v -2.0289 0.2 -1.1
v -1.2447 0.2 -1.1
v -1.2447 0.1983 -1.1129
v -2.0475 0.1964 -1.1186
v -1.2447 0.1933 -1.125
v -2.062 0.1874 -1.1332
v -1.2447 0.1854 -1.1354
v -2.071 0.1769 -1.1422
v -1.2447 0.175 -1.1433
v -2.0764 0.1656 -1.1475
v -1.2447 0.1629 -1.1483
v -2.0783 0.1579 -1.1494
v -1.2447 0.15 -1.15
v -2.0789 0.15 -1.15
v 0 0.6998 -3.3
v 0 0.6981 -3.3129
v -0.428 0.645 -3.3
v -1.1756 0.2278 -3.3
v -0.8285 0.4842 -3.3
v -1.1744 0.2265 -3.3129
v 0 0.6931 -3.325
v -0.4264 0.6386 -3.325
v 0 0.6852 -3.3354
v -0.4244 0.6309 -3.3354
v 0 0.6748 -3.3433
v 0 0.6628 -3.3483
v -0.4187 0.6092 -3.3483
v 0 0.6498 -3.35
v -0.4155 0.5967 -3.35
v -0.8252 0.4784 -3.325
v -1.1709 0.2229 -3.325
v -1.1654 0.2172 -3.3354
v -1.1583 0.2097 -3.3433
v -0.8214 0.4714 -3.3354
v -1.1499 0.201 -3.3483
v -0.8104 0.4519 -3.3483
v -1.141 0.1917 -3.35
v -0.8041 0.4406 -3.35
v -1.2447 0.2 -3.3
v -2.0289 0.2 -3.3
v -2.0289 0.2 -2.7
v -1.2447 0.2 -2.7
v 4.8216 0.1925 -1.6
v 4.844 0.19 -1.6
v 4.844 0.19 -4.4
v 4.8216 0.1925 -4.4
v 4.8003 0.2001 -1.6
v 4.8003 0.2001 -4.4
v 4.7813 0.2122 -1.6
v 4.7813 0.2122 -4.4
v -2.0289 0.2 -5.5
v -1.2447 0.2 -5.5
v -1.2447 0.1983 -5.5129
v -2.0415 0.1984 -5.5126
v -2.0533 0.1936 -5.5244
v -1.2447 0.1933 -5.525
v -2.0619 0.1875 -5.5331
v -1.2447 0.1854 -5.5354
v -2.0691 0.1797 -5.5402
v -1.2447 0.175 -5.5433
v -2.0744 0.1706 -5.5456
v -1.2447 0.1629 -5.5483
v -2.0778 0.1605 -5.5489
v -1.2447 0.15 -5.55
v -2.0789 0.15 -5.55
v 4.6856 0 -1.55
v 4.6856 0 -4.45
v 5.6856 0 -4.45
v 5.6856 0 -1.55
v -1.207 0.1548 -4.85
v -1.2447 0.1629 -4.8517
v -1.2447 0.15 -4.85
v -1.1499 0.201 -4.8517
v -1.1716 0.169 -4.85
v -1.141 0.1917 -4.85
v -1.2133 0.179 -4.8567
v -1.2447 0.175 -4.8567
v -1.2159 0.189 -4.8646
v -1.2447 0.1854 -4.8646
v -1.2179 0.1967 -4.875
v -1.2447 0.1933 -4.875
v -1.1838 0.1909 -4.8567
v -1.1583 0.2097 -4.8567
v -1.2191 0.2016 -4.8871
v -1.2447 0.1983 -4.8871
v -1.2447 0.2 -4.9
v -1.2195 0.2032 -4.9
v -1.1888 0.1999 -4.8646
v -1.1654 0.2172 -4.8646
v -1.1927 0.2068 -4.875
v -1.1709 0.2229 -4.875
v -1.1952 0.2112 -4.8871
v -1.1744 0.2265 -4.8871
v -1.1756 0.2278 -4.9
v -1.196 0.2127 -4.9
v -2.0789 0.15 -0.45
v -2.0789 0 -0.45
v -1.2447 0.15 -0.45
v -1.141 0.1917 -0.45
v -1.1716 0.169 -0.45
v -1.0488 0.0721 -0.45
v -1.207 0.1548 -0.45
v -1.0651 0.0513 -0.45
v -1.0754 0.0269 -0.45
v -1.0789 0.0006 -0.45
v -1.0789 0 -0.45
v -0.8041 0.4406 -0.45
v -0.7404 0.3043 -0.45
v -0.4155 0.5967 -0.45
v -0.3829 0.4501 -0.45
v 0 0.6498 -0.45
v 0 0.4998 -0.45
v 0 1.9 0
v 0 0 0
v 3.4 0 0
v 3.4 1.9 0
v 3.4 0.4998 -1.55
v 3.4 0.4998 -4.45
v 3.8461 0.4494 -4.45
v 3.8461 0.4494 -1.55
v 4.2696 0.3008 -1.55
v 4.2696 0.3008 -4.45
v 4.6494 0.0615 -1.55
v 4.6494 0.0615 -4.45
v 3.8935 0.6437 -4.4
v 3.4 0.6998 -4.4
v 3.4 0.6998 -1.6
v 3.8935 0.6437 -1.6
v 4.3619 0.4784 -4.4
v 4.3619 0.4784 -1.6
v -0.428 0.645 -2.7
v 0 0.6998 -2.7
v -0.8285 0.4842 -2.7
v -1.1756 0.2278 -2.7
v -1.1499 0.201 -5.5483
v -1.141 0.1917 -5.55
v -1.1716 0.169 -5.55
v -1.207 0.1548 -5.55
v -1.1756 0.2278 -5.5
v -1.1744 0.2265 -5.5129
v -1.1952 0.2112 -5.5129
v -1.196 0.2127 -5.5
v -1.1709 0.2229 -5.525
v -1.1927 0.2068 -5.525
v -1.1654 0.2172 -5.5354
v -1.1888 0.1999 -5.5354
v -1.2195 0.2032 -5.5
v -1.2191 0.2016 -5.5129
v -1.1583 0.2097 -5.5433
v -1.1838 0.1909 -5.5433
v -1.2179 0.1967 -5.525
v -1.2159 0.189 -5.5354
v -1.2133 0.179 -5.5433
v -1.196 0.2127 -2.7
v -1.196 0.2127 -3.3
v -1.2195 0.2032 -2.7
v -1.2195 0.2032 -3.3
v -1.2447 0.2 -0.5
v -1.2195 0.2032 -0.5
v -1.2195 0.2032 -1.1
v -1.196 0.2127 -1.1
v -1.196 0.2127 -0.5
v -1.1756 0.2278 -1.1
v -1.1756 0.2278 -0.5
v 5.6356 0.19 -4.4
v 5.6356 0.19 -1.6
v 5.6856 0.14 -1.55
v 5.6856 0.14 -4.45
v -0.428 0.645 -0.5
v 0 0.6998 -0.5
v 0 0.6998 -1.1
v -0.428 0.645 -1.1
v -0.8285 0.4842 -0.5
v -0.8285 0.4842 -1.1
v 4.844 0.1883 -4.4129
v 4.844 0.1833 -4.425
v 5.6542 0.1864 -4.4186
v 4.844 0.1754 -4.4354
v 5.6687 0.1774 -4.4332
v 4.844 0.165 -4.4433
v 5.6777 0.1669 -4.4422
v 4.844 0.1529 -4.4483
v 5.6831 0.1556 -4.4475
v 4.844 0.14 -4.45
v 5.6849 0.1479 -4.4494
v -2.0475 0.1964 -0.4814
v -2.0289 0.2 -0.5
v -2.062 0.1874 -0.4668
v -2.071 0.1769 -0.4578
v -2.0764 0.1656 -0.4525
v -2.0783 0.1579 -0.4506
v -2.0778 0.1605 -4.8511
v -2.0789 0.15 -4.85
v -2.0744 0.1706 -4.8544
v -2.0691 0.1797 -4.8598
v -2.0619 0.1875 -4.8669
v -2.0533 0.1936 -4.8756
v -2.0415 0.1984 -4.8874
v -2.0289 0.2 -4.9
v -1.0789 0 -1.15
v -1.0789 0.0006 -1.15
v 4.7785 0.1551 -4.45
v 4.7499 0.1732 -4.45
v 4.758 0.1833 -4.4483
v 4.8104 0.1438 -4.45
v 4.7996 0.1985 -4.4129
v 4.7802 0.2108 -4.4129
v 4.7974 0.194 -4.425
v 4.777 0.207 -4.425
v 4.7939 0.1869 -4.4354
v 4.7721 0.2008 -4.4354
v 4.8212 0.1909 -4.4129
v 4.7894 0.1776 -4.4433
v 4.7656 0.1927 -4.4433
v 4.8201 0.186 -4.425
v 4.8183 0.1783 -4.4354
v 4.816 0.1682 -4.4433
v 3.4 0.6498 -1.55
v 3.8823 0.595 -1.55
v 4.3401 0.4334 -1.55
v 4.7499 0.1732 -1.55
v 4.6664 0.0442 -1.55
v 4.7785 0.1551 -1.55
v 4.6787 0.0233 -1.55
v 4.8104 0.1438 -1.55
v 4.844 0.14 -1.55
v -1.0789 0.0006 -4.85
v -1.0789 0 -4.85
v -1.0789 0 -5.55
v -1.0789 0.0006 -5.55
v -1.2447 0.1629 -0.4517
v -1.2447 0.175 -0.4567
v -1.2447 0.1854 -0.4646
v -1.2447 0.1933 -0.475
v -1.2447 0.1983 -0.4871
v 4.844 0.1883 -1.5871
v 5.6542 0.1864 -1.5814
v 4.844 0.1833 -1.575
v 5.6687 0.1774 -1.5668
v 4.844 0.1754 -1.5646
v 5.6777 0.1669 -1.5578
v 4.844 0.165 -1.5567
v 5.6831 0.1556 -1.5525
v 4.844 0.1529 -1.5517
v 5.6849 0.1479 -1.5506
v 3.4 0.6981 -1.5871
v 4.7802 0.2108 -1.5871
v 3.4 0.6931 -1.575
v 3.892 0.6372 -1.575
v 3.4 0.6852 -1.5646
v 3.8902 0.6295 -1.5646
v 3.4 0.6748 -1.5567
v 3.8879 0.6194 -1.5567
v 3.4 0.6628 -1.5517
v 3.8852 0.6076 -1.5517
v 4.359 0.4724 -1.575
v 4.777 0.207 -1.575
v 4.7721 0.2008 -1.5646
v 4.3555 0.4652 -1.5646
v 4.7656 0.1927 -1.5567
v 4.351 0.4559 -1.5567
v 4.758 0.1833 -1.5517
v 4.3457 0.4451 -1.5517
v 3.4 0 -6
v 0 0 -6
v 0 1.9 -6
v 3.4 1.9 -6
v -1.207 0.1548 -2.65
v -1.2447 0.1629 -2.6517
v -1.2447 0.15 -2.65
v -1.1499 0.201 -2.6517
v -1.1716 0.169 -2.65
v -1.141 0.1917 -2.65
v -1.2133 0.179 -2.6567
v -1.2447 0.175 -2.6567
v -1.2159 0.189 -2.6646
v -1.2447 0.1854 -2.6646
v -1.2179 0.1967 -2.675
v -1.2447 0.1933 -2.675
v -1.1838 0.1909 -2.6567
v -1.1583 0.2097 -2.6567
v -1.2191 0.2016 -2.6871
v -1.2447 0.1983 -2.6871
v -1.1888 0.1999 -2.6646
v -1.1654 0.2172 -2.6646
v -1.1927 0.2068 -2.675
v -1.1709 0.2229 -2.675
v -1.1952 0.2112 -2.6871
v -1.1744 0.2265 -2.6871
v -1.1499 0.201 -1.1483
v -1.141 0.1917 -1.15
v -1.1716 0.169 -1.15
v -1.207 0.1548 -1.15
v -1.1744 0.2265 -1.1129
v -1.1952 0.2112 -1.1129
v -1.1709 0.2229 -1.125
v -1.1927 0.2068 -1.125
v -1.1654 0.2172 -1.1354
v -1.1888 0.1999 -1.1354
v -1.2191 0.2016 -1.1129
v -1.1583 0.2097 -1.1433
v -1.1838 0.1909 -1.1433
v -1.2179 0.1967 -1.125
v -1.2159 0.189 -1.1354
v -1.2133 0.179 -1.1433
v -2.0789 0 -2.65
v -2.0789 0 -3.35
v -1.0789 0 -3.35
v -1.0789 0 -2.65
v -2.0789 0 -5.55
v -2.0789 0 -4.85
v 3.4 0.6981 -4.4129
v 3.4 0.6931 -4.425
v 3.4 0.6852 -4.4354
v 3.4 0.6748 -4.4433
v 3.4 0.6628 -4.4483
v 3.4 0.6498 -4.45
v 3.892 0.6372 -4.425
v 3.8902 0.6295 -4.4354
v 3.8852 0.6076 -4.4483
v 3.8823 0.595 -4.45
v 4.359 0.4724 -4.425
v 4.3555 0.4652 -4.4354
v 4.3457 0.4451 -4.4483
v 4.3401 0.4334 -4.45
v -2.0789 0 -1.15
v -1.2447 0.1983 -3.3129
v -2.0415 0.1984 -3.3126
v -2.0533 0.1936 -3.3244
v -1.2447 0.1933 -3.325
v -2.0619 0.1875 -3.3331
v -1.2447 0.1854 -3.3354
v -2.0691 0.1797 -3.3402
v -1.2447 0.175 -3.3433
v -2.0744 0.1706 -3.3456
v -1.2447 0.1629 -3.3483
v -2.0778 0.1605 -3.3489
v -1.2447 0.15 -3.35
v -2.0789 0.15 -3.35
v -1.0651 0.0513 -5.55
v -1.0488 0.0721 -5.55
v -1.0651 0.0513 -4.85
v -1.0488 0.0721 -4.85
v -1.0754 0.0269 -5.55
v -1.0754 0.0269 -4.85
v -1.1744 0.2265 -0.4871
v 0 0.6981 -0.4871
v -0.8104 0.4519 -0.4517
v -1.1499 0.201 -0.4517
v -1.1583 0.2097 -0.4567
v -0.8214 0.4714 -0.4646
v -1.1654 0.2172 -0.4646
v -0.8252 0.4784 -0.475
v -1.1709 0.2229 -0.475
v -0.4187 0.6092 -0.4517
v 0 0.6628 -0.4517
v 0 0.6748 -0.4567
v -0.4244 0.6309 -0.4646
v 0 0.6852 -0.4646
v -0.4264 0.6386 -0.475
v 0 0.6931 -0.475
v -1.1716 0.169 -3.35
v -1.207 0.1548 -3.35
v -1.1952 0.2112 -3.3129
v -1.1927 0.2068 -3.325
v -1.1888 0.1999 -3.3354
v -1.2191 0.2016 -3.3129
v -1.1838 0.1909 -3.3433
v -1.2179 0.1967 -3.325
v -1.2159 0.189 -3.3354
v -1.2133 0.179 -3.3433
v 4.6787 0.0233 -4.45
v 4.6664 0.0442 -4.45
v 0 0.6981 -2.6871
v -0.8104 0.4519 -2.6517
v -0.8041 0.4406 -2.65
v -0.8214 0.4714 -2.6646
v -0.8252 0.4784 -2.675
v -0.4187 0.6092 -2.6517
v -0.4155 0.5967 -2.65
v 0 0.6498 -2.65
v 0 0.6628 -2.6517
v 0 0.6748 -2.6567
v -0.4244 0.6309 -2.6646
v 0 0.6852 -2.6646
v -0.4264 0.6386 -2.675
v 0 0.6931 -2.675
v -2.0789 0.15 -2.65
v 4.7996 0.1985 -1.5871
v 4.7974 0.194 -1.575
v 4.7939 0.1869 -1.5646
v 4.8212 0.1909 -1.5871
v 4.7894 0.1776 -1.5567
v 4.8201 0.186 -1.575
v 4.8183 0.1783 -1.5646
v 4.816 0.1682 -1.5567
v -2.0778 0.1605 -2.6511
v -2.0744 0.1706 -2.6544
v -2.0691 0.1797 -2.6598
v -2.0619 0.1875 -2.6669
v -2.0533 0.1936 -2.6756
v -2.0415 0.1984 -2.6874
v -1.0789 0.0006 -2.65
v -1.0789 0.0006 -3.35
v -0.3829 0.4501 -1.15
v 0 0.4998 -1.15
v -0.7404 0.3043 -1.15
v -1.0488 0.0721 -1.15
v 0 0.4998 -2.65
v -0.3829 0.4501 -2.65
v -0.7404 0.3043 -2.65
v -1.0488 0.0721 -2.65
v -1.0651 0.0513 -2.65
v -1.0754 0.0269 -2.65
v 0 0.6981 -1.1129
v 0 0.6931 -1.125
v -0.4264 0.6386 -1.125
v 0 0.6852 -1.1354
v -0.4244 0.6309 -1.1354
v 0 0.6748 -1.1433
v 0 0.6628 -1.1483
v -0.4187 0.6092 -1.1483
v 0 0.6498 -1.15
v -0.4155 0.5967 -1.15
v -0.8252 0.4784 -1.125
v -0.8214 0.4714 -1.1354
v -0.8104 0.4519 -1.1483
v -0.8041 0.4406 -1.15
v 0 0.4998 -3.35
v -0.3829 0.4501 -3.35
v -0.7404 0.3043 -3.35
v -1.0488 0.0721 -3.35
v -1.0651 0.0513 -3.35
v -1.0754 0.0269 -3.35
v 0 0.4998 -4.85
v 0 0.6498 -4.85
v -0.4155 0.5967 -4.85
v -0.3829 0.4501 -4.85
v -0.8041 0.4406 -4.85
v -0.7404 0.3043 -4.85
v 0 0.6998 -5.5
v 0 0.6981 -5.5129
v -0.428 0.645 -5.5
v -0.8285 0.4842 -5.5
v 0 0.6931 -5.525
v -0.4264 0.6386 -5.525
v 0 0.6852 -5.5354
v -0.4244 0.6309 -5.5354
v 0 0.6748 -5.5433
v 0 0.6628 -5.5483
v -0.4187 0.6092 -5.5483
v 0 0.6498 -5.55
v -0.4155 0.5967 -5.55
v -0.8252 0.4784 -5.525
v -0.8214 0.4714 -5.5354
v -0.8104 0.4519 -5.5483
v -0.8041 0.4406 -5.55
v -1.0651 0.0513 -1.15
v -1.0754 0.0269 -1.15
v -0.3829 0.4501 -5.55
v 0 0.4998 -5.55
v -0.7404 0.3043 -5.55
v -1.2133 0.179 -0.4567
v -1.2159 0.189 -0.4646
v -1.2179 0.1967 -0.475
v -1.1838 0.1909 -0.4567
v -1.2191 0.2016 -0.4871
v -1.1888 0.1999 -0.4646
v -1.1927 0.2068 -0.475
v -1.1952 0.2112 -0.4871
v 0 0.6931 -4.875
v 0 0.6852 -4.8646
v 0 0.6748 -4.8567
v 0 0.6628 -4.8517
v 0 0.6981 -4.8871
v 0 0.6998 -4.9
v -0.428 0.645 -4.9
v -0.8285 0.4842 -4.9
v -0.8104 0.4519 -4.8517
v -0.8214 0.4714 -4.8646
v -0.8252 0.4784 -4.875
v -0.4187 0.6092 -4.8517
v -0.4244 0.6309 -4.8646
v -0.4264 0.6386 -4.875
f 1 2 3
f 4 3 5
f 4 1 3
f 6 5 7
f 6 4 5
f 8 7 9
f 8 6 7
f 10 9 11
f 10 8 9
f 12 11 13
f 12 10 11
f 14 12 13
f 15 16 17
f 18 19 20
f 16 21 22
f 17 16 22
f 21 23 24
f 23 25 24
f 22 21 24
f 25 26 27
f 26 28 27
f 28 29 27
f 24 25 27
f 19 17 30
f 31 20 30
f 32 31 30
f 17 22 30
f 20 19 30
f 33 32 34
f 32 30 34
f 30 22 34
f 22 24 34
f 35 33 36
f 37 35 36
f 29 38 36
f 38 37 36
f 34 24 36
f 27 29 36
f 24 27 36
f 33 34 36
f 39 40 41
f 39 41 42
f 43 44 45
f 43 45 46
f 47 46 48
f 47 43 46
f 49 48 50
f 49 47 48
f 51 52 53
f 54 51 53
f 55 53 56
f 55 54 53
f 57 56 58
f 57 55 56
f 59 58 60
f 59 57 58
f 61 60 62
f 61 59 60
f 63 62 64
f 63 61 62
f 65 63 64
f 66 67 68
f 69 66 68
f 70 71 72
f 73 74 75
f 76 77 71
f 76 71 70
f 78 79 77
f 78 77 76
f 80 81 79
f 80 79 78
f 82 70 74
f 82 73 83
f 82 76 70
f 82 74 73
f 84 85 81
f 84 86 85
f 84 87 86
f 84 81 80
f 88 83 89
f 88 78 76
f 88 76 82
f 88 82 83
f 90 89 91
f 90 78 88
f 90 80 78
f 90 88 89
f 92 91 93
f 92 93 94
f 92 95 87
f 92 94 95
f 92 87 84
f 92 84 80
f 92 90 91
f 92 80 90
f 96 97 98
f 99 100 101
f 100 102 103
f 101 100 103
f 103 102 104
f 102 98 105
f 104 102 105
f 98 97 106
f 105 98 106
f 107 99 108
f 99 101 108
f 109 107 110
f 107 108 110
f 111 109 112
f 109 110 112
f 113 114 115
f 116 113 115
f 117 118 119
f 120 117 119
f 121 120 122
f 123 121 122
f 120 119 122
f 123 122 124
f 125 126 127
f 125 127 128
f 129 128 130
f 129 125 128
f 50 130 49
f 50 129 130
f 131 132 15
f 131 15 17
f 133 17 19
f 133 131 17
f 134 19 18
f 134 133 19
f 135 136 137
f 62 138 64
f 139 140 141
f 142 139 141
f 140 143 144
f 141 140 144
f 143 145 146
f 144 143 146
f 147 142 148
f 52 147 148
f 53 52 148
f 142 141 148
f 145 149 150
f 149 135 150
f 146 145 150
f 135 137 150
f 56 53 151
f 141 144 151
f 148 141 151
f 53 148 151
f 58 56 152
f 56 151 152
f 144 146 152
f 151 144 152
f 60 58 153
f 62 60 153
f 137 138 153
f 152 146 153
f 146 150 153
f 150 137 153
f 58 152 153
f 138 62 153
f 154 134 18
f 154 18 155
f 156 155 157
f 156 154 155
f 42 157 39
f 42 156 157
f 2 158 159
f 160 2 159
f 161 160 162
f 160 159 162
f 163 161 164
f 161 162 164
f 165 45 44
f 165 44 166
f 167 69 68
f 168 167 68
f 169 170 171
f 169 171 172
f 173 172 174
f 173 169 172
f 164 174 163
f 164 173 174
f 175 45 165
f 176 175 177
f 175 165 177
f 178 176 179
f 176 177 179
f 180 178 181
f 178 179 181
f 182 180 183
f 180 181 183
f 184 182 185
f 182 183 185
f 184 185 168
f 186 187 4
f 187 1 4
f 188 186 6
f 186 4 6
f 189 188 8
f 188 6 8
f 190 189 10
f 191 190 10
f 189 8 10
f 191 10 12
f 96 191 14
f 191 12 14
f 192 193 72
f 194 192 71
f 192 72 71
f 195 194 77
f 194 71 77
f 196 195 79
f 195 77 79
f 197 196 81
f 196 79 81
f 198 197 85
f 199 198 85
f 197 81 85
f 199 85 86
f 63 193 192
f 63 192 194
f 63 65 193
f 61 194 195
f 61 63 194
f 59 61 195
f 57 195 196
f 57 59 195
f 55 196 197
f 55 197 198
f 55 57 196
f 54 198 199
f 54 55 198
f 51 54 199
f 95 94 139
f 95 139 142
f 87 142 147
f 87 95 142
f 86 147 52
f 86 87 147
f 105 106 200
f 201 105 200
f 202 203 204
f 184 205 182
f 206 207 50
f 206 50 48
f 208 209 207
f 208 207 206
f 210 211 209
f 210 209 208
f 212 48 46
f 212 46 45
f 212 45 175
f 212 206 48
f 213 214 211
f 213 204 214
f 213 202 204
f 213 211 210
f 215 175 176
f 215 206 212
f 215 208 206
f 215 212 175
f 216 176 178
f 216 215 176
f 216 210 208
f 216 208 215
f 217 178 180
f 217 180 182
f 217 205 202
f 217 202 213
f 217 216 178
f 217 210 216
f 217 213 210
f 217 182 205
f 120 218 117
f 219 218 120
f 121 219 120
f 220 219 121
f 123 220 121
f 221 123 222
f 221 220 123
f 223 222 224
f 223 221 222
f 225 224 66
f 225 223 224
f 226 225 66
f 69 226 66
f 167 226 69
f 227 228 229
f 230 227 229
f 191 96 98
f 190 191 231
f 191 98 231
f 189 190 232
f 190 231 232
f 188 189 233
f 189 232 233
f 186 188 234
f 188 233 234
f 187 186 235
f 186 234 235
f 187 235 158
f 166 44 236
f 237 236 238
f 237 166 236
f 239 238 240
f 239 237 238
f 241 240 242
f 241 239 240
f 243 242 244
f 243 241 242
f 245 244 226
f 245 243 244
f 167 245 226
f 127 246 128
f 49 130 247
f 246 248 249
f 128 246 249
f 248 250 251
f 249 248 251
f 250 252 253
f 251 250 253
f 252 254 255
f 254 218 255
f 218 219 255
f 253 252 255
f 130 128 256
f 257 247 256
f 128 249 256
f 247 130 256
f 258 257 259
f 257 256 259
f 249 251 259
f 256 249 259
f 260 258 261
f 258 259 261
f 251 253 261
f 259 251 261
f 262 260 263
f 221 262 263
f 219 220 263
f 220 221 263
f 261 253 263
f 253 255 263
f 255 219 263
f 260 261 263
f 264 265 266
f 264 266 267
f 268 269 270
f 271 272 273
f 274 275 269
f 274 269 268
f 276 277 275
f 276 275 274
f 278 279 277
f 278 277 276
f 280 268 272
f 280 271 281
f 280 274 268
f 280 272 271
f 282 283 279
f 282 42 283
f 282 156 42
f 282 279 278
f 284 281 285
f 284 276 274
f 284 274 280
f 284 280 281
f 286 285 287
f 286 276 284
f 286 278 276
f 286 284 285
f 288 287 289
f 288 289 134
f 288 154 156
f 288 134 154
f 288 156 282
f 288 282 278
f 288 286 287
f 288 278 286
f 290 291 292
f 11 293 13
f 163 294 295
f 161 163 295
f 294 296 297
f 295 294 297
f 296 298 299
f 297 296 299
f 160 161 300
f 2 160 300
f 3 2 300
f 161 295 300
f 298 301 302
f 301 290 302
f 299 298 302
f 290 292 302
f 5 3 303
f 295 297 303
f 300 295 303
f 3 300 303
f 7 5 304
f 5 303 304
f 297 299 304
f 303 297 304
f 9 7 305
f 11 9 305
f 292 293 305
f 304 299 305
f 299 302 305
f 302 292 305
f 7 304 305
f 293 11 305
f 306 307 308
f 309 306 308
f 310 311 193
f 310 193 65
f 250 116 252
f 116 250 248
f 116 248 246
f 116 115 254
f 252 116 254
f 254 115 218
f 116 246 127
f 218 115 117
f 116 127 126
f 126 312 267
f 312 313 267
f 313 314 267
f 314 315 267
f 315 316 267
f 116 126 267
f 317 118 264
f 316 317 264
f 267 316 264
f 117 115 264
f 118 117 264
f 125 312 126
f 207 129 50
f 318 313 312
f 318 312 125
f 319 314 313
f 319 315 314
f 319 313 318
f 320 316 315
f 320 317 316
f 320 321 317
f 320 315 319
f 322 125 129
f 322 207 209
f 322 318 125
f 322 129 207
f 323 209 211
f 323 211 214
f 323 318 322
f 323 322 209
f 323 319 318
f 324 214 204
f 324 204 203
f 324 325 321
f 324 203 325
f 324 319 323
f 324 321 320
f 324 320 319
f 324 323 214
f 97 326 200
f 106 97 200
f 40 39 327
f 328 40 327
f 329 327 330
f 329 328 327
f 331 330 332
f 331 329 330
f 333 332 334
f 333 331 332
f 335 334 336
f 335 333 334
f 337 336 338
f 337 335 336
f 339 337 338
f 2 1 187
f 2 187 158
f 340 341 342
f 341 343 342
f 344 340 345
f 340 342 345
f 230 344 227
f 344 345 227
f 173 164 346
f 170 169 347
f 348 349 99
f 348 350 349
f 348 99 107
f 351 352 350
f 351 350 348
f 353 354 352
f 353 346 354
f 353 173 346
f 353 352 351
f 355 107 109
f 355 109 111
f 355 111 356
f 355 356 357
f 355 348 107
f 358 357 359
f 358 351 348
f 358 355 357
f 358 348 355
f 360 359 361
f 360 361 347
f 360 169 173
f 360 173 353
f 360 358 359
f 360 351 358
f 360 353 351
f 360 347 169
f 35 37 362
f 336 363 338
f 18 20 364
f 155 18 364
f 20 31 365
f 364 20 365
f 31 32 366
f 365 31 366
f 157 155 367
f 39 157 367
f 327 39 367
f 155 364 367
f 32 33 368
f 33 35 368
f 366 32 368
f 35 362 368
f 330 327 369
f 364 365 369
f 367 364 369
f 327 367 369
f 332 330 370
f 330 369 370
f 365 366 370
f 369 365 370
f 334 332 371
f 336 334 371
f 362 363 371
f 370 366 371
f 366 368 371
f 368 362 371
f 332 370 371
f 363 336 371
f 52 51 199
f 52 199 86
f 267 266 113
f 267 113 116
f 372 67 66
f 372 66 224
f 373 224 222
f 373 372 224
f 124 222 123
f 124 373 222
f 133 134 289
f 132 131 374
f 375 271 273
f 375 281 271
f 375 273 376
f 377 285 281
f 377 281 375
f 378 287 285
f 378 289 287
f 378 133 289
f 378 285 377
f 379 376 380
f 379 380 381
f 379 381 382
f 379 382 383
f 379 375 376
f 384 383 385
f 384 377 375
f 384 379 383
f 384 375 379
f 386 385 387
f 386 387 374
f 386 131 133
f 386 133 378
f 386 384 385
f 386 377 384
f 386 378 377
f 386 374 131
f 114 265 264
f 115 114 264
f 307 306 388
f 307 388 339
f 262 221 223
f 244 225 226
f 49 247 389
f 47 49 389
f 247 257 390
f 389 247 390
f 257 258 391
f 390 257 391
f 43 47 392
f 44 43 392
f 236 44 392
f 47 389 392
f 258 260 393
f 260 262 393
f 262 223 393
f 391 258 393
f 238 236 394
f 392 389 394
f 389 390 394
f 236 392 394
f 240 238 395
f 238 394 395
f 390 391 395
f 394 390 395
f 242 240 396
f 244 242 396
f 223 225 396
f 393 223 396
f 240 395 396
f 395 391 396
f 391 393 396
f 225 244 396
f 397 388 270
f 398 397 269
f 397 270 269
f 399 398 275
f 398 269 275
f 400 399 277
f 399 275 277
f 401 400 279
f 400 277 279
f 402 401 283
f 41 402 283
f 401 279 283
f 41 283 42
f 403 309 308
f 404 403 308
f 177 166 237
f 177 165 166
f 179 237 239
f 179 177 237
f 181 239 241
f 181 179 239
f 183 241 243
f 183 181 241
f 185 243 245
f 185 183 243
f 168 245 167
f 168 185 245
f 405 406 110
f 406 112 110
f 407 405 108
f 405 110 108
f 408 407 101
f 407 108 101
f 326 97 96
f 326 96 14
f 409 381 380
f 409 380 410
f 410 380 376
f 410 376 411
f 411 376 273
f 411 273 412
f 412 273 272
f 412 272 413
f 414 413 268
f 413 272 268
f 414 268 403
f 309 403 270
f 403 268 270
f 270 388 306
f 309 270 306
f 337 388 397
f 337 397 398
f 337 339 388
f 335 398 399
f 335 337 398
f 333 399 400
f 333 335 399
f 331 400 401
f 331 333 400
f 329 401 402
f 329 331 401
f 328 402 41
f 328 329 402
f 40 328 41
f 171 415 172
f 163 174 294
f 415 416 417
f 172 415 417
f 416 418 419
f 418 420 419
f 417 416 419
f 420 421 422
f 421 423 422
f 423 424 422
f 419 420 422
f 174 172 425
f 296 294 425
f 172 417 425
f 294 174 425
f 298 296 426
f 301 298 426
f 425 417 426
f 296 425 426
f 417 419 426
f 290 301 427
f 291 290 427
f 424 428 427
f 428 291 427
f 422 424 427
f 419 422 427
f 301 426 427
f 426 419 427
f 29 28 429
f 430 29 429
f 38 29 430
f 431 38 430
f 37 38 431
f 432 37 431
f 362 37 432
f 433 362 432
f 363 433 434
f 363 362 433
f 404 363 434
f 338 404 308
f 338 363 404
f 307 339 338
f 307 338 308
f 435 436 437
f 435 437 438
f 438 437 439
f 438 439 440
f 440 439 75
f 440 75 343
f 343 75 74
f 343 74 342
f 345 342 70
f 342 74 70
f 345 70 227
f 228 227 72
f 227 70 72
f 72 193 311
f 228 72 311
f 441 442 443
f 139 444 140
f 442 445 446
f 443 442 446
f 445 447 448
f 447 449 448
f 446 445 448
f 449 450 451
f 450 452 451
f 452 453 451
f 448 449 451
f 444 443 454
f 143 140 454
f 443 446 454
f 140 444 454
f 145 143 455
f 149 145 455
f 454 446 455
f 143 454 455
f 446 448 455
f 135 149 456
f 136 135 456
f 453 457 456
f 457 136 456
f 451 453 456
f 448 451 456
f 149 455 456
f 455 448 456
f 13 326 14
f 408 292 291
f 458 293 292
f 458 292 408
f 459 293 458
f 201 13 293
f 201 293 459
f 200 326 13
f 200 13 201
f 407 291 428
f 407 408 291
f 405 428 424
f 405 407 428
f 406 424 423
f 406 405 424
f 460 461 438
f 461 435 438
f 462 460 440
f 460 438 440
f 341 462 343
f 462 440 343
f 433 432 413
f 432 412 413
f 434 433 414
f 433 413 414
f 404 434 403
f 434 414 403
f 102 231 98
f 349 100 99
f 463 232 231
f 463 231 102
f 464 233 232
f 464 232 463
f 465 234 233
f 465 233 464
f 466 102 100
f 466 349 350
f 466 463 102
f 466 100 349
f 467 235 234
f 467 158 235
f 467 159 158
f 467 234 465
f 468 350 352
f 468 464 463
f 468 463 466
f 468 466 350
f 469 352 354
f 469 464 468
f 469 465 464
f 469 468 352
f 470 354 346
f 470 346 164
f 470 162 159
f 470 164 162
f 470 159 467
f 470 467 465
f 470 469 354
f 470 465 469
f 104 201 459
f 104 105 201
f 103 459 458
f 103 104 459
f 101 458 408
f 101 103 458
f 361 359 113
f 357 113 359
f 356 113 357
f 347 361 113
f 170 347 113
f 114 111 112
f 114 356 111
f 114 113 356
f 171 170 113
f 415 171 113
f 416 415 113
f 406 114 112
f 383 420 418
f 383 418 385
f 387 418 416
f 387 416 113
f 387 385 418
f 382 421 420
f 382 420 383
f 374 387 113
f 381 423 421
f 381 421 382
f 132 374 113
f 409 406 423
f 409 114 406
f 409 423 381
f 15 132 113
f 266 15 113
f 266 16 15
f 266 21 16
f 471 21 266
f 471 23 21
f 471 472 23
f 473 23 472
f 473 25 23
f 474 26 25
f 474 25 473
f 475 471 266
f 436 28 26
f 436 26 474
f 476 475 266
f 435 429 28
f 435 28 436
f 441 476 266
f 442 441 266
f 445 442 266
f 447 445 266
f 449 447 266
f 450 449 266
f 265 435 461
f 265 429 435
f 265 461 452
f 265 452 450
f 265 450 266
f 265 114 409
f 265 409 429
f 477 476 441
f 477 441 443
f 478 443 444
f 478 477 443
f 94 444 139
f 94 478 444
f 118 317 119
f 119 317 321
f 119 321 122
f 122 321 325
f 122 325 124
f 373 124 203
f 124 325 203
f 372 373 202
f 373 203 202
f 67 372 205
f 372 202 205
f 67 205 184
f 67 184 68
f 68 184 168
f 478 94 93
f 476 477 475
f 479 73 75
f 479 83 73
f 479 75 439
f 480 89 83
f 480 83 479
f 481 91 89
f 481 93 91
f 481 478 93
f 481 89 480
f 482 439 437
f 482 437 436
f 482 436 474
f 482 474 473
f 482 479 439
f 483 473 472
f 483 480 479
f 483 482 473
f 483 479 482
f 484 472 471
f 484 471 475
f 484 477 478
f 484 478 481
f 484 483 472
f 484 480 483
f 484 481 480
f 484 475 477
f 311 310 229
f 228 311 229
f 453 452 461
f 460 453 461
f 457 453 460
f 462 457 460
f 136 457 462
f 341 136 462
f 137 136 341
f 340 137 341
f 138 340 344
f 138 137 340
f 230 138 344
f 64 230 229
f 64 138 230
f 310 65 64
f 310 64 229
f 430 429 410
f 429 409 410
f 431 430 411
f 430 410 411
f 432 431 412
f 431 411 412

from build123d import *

# Parameters (mm, degrees)
ESQUISSE1_W        = 3.4
ESQUISSE1_H        = 6
BOSS_EXTRU_1_DEPTH = 1.9
ESQUISSE2_W        = 2.9
ESQUISSE2_H        = 0.2
R_VOLUTION1_ANGLE  = 40
ESQUISSE4_W        = 1
ESQUISSE4_H        = 2.9
BOSS_EXTRU_2_DEPTH = 0.19
CONG_1_R           = 0.1
CONG_2_R           = 0.05
ESQUISSE6_W        = 0.7
ESQUISSE6_H        = 0.2
R_VOLUTION2_ANGLE  = 46
ESQUISSE8_W        = 1
ESQUISSE8_H        = 0.7
BOSS_EXTRU_3_DEPTH = 0.2
CONG_3_R           = 0.1
CONG_4_R           = 0.05


with BuildPart() as part:
    # Esquisse1 → Boss.-Extru.1 (new body)
    with BuildSketch(Plane(origin=(0, 0, 0), x_dir=(1, 0, 0), z_dir=(0, 1, 0))):
        with Locations((1.7, 3)):
            Rectangle(ESQUISSE1_W, ESQUISSE1_H)
    extrude(amount=BOSS_EXTRU_1_DEPTH)

    # Esquisse2 → Révolution1 (revolve)
    with BuildSketch(Plane(origin=(3.4, 0, 0), x_dir=(0, 0, -1), z_dir=(1, 0, 0))):
        with Locations((3, 0.599818591)):
            Rectangle(ESQUISSE2_W, ESQUISSE2_H)
    revolve(axis=Axis((3.4, -1.500181409, -1.55), (0, 0, -1)), revolution_arc=R_VOLUTION1_ANGLE)

    # Esquisse4 → Boss.-Extru.2 (add)
    with BuildSketch(Plane(origin=(0, 0, 0), x_dir=(1, 0, 0), z_dir=(0, 1, 0))):
        with Locations((5.185575219, 3)):
            Rectangle(ESQUISSE4_W, ESQUISSE4_H)
    extrude(amount=BOSS_EXTRU_2_DEPTH)

    # Congé1
    # the kernel refuses this fillet: 0.1 mm, written as the material it adds along each edge
    with BuildSketch(Plane(origin=(4.685575219, 0.031907477, -4.45), x_dir=(-0.7735020248903554, 0.6337938288517173, 0), z_dir=(0, 0, 1))) as cong_1_piece_1:
        with BuildLine():
            CenterArc((0.04556478, 0.099993175), CONG_1_R, 228.861958966, 41.807458726)
            Line((-0.020222762, 0.024680498), (-0.021538513, 0.023174245))
            ThreePointArc((-0.021538513, 0.023174245), (-0.011658385, 0.011072661), (-0.001547004, -0.001267588))
            Line((-0.001547004, -0.001267588), (-2.3367e-05, -0.001999863))
            ThreePointArc((-2.3367e-05, -0.001999863), (0.023366554, -0.002136504), (0.046756475, -0.001999863))
            Line((0.046756475, -0.001999863), (0.046733108, 0))
        make_face()
    extrude(amount=2.9)
    with BuildSketch(Plane(origin=(4.808292159, 0.19, -1.55), x_dir=(-0.7733264230058849, 0.6340080784035191, 0), z_dir=(0, 0, -1))) as cong_1_piece_2:
        with BuildLine():
            CenterArc((0.035756325, 0.099996843), CONG_1_R, 230.653545738, 38.8911858)
            Line((-0.027644483, 0.022664201), (-0.028912499, 0.021117548))
            Line((-0.028912499, 0.021117548), (-0.001268016, -0.001546653))
            Line((-0.001268016, -0.001546653), (1.5892e-05, -0.001999937))
            ThreePointArc((1.5892e-05, -0.001999937), (0.01748087, -0.001930549), (0.034945848, -0.001999937))
            Line((0.034945848, -0.001999937), (0.03496174, 0))
        make_face()
    extrude(amount=2.9)

    # Congé2
    cong_2_edges = [part.edges().sort_by_distance(p)[0] for p in [
        (5.264807437, 0.19, -4.45),
        (5.685575219, 0.19, -3),
        (5.264807437, 0.19, -1.55),
        (4.132405504, 0.574326286, -4.45),
        (4.132405504, 0.574326286, -1.55),
        (4.810748495, 0.195704196, -1.55),
        (4.810748495, 0.195704196, -4.45),
    ]]
    fillet(cong_2_edges, radius=CONG_2_R)

    # Esquisse6 → Révolution2 (revolve)
    with BuildSketch(Plane.ZY):
        with Locations((-3, 0.599818591)):
            Rectangle(ESQUISSE6_W, ESQUISSE6_H)
        with Locations((-5.2, 0.599818591)):
            Rectangle(ESQUISSE6_W, ESQUISSE6_H)
        with Locations((-0.8, 0.599818591)):
            Rectangle(ESQUISSE6_W, ESQUISSE6_H)
    revolve(axis=Axis((0, -1, -6), (0, 0, 1)), revolution_arc=R_VOLUTION2_ANGLE)

    # Esquisse8 → Boss.-Extru.3 (add)
    with BuildSketch(Plane(origin=(0, 0, 0), x_dir=(1, 0, 0), z_dir=(0, 1, 0))):
        with Locations((-1.578879206, 0.8)):
            Rectangle(ESQUISSE8_W, ESQUISSE8_H)
        with Locations((-1.578879206, 3)):
            Rectangle(ESQUISSE8_W, ESQUISSE8_H)
        with Locations((-1.578879206, 5.2)):
            Rectangle(ESQUISSE8_W, ESQUISSE8_H)
    extrude(amount=BOSS_EXTRU_3_DEPTH)

    # Congé3
    cong_3_edges = [part.edges().sort_by_distance(p)[0] for p in [
        (-1.078879206, 0.041861538, -0.8),
        (-1.203903336, 0.2, -0.8),
        (-1.203903336, 0.2, -3),
        (-1.203903336, 0.2, -5.2),
        (-1.078879206, 0.041861538, -3),
        (-1.078879206, 0.041861538, -5.2),
    ]]
    fillet(cong_3_edges, radius=CONG_3_R)

    # Congé4
    cong_4_edges = [part.edges().sort_by_distance(p)[0] for p in [
        (-2.078879206, 0.2, -0.8),
        (-1.661803435, 0.2, -0.45),
        (-2.078879206, 0.2, -3),
        (-1.661803435, 0.2, -2.65),
        (-2.078879206, 0.2, -5.2),
        (-1.661803435, 0.2, -4.85),
        (-0.633401975, 0.577398231, -1.15),
        (-0.633401975, 0.577398231, -0.45),
        (-1.661803435, 0.2, -1.15),
        (-0.633401975, 0.577398231, -5.55),
        (-0.633401975, 0.577398231, -4.85),
        (-1.661803435, 0.2, -5.55),
        (-0.633401975, 0.577398231, -3.35),
        (-0.633401975, 0.577398231, -2.65),
        (-1.661803435, 0.2, -3.35),
        (-1.207464749, 0.207201966, -0.45),
        (-1.207464749, 0.207201966, -1.15),
        (-1.207464749, 0.207201966, -4.85),
        (-1.207464749, 0.207201966, -5.55),
        (-1.207464749, 0.207201966, -2.65),
        (-1.207464749, 0.207201966, -3.35),
    ]]
    fillet(cong_4_edges, radius=CONG_4_R)


solid = part.part
